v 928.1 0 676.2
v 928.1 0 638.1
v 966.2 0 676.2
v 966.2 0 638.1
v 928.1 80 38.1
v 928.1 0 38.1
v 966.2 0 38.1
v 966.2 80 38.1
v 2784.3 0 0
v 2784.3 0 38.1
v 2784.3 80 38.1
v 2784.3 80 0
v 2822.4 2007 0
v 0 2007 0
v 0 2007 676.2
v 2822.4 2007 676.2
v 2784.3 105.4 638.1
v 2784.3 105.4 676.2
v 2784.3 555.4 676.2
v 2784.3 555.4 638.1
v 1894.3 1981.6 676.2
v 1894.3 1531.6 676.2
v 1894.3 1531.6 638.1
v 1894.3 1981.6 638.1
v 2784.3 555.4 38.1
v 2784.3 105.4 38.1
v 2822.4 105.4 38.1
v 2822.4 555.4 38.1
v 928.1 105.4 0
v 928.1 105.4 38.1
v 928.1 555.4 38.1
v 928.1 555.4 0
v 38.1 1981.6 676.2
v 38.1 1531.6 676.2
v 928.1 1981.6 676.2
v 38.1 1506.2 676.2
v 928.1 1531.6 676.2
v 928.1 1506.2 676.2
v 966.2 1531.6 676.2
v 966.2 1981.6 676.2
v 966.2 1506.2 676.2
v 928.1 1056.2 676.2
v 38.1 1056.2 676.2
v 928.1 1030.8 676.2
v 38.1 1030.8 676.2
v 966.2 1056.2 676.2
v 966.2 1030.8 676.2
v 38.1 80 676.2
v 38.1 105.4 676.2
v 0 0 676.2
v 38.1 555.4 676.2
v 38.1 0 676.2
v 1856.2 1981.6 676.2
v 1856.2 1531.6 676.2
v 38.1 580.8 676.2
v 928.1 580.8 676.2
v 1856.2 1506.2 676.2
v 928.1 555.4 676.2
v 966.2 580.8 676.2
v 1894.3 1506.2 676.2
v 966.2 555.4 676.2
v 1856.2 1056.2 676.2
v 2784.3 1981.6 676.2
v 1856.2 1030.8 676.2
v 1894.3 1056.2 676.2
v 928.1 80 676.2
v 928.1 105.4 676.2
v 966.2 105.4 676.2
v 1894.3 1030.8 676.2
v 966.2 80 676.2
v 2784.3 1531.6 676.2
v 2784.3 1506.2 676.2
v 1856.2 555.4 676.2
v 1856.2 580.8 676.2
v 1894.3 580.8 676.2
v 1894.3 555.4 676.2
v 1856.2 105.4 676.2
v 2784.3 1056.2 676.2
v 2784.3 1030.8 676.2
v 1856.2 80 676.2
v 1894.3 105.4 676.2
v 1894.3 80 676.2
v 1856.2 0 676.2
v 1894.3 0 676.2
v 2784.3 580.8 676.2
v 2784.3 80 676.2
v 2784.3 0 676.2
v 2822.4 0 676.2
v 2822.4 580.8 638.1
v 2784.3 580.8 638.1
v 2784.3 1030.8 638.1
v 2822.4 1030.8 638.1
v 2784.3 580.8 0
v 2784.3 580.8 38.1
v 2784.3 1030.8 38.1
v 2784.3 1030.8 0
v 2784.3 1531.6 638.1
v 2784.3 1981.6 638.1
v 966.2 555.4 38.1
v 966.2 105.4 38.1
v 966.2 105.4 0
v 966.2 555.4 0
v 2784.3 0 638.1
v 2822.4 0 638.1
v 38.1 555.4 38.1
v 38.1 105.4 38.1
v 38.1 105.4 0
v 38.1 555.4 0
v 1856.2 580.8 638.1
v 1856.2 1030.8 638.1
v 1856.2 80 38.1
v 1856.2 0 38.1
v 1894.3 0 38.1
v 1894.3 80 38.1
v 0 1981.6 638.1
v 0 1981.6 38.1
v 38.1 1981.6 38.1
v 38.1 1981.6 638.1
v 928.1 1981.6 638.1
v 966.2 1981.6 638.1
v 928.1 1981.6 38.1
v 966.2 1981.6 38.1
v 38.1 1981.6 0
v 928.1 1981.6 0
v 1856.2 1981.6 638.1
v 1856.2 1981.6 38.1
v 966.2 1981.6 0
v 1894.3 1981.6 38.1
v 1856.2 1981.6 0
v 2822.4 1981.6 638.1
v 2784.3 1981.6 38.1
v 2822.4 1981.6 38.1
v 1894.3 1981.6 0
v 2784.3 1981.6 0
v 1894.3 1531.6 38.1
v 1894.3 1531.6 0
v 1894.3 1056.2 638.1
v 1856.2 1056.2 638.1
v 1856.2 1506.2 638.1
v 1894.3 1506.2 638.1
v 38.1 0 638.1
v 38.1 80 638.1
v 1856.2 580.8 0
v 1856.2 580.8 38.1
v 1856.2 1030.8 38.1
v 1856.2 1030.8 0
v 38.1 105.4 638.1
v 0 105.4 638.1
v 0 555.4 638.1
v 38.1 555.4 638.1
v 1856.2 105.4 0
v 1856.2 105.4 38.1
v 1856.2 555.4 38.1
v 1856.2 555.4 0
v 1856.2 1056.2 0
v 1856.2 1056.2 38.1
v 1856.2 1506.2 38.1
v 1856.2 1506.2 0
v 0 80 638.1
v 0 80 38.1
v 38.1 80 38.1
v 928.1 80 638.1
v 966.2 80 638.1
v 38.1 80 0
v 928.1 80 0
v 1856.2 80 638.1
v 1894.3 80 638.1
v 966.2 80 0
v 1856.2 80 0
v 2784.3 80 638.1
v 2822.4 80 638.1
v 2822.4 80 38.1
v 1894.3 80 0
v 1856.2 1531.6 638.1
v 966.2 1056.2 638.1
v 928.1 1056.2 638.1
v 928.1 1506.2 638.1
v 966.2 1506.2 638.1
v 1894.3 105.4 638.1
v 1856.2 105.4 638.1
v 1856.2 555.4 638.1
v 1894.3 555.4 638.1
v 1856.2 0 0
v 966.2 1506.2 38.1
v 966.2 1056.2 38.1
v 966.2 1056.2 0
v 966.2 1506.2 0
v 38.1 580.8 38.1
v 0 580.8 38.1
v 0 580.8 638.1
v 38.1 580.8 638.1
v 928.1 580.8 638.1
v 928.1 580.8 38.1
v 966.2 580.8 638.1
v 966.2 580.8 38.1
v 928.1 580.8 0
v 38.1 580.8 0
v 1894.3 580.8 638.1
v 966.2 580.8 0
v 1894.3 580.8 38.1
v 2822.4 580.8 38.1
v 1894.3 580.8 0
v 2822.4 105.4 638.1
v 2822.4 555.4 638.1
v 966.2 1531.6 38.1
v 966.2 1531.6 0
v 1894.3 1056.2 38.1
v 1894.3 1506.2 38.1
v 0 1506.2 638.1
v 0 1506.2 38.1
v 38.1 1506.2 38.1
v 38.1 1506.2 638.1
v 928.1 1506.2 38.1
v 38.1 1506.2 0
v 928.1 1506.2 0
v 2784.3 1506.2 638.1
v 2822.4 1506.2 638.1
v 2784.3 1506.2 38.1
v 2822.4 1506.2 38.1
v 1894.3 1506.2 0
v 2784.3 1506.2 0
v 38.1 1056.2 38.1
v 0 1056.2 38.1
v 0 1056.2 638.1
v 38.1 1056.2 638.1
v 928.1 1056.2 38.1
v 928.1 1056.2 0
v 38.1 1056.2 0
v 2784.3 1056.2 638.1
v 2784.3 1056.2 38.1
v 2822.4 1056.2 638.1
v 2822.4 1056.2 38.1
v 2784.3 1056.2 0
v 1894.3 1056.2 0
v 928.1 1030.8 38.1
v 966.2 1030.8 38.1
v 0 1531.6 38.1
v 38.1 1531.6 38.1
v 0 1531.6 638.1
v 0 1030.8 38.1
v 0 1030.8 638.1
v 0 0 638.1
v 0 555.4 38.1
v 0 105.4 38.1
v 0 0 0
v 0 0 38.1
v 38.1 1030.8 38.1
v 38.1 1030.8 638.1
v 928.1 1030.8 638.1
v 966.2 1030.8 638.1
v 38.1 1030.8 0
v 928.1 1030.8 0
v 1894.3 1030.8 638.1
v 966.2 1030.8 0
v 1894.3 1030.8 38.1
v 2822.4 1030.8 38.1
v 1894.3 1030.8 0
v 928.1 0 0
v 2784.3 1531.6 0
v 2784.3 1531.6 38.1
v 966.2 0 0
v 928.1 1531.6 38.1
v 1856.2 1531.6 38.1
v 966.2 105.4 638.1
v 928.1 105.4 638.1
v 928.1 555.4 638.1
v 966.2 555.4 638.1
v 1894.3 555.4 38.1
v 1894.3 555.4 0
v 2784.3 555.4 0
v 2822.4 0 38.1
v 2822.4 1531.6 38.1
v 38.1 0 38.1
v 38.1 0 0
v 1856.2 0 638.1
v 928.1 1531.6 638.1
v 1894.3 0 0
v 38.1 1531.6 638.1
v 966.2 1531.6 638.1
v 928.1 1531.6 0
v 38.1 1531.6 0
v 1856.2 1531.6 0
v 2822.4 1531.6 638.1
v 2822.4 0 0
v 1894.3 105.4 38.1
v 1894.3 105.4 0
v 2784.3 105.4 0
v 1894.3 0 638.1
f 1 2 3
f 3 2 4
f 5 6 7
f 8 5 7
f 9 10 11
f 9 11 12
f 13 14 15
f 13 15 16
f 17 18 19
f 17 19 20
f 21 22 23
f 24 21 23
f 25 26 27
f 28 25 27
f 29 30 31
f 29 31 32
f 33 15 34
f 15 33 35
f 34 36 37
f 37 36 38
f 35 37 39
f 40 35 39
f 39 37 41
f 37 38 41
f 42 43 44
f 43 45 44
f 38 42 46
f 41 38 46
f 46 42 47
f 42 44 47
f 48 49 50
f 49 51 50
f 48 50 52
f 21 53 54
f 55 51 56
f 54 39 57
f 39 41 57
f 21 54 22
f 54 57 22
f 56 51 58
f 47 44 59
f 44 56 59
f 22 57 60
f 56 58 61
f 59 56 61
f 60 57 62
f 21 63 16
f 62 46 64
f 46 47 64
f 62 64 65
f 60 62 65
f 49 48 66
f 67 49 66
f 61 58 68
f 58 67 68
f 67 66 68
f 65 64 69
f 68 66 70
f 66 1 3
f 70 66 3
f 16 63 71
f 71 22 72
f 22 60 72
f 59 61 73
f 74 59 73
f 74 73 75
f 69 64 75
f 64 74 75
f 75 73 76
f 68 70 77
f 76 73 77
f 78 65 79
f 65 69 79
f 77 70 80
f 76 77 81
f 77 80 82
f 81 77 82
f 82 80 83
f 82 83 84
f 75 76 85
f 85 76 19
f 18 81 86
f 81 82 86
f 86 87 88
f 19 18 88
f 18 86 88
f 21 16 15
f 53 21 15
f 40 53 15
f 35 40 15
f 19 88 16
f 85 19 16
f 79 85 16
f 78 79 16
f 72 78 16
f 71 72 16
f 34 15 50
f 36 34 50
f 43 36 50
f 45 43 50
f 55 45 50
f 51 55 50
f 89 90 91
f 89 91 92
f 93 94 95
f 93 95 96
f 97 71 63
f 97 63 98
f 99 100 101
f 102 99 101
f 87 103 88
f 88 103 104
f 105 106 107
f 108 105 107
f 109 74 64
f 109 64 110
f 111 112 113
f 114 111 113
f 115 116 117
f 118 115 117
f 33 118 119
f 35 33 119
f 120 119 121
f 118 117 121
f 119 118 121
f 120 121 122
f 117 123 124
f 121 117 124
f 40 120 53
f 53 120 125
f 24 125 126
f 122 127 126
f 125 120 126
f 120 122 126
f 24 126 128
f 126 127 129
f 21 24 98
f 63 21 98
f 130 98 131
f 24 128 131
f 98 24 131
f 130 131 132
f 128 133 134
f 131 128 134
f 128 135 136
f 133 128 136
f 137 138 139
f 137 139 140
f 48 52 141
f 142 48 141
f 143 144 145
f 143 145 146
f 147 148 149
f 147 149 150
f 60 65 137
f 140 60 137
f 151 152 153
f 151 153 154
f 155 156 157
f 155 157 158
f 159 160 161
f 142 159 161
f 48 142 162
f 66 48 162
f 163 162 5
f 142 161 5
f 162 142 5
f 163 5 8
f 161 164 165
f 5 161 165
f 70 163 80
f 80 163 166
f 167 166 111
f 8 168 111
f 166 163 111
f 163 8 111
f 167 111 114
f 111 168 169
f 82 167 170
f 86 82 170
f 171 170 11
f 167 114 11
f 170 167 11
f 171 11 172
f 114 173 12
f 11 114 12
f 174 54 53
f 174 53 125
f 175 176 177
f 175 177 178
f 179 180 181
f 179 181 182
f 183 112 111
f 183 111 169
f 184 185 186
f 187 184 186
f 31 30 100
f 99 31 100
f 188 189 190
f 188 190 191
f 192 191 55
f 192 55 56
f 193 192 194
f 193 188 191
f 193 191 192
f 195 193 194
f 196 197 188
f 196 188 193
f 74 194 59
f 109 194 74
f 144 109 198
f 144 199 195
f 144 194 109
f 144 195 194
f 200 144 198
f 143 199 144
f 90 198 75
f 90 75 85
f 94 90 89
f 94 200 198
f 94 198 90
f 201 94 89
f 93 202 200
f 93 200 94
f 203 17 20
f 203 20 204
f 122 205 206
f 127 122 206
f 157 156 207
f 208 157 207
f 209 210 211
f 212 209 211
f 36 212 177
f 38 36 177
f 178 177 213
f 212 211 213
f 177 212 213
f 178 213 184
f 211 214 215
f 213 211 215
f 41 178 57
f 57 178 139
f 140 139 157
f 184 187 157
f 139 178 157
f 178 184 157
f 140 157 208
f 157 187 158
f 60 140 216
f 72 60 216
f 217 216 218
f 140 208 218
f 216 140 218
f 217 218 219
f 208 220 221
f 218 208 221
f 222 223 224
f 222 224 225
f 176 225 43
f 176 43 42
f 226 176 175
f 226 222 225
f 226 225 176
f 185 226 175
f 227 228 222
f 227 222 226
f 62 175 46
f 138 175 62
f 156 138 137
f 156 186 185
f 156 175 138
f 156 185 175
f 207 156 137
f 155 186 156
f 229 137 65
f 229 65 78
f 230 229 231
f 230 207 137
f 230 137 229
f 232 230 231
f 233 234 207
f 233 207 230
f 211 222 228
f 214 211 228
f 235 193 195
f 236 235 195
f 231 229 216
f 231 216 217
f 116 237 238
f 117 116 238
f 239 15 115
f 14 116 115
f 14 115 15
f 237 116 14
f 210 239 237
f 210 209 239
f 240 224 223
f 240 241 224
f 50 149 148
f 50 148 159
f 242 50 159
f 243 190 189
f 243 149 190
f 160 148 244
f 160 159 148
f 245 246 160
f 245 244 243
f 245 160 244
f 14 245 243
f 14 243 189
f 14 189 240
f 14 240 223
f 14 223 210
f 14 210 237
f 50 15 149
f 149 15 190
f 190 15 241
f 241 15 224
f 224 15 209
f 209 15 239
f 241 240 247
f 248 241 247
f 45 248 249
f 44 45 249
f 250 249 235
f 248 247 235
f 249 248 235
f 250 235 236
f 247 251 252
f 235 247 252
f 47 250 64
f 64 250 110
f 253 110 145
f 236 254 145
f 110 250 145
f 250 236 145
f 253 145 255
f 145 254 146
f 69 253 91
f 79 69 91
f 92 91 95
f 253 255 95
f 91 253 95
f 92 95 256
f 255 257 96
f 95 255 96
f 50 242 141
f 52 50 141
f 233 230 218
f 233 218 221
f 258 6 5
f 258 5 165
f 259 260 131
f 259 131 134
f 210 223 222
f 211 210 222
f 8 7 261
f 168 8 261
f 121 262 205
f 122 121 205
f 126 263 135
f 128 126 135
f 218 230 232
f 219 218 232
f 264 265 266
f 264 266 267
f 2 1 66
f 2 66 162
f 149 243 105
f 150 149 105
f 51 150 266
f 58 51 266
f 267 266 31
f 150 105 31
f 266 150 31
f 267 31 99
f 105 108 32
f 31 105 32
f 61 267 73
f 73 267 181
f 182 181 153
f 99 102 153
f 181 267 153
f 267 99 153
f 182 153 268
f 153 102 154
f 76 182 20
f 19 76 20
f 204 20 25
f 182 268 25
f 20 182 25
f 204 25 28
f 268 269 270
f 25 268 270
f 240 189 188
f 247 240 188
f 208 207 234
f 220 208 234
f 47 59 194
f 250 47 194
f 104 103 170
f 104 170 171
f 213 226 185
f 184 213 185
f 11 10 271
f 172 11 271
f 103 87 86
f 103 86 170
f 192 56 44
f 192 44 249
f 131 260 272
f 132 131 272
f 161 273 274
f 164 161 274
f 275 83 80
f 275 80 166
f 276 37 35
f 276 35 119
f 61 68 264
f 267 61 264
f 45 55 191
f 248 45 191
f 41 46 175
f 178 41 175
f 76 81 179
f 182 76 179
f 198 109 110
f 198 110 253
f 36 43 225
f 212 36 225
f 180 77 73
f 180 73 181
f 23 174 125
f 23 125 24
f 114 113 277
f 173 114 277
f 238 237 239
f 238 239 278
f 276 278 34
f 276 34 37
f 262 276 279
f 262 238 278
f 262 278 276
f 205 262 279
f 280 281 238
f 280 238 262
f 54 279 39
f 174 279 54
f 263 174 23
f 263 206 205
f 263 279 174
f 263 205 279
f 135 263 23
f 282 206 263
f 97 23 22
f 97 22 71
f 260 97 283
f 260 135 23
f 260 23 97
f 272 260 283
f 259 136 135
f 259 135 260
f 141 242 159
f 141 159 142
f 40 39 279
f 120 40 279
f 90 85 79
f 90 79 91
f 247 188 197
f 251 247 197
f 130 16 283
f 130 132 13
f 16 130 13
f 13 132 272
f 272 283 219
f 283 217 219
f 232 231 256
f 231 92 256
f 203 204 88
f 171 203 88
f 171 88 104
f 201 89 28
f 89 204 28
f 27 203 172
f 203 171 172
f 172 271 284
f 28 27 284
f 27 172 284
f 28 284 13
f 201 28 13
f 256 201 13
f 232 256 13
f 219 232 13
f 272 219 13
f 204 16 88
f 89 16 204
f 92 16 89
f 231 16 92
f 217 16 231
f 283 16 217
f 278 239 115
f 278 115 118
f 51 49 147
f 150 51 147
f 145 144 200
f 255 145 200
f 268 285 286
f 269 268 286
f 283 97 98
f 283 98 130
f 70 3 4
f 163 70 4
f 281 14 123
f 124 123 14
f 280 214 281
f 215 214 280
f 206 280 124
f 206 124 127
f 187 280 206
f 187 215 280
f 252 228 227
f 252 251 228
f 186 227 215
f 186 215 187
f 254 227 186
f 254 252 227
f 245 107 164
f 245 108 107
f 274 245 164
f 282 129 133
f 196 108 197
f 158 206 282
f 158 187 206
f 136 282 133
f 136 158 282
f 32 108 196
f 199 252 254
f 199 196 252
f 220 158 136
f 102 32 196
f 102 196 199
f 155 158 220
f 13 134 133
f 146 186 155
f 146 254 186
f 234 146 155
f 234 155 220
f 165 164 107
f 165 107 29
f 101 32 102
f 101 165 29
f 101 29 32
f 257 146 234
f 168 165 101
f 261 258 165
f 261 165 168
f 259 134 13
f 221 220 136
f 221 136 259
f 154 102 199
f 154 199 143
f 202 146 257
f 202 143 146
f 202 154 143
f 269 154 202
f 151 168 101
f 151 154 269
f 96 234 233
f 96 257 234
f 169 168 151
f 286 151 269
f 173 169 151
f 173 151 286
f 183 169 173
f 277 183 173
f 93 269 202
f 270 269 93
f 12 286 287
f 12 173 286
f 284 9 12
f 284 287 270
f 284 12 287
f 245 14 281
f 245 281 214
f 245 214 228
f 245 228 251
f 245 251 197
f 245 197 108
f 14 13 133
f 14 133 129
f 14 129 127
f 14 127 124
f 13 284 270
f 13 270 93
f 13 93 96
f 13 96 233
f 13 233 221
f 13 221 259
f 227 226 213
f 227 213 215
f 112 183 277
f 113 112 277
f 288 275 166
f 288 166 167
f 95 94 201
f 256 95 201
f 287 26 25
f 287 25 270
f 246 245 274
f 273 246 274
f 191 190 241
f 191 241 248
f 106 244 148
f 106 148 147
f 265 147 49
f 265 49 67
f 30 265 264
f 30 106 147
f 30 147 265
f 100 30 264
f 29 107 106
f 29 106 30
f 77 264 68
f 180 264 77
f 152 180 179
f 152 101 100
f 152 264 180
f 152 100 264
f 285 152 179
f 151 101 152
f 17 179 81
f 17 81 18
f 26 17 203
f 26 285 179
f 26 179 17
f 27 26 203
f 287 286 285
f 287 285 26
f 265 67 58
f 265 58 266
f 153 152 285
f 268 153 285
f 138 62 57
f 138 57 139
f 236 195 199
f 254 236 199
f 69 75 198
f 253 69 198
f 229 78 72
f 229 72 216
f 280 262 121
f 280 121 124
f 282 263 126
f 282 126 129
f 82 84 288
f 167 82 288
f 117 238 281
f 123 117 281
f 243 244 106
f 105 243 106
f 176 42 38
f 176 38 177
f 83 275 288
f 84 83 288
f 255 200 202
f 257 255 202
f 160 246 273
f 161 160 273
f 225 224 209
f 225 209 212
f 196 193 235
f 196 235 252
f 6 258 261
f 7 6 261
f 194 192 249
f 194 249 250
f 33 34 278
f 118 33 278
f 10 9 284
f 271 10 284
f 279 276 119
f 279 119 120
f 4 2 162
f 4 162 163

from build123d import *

# Parameters (mm, degrees)
CROQUIS1_W                = 38.1
CROQUIS1_H                = 38.1
SALIENTE_EXTRUIR1_DEPTH   = 80
SALIENTE_EXTRUIR1_2_DEPTH = 80
SALIENTE_EXTRUIR1_3_DEPTH = 80
SALIENTE_EXTRUIR1_4_DEPTH = 80
SALIENTE_EXTRUIR1_5_DEPTH = 80
SALIENTE_EXTRUIR1_6_DEPTH = 80
SALIENTE_EXTRUIR1_7_DEPTH = 80
SALIENTE_EXTRUIR1_8_DEPTH = 80
CROQUIS2_W                = 2822.4
CROQUIS2_H                = 676.2
SALIENTE_EXTRUIR2_DEPTH   = 25.4
CROQUIS3_W                = 38.1
CROQUIS3_H                = 38.1
SALIENTE_EXTRUIR3_DEPTH   = 450
CROQUIS4_W                = 2822.4
CROQUIS4_H                = 676.2
SALIENTE_EXTRUIR4_DEPTH   = 25.4
CROQUIS5_W                = 38.1
CROQUIS5_H                = 38.1
SALIENTE_EXTRUIR5_DEPTH   = 450
CROQUIS6_W                = 2822.4
CROQUIS6_H                = 676.2
SALIENTE_EXTRUIR6_DEPTH   = 25.4
CROQUIS7_W                = 38.1
CROQUIS7_H                = 38.1
SALIENTE_EXTRUIR7_DEPTH   = 450
CROQUIS8_W                = 2822.4
CROQUIS8_H                = 676.2
SALIENTE_EXTRUIR8_DEPTH   = 25.4
CROQUIS9_W                = 38.1
CROQUIS9_H                = 38.1
SALIENTE_EXTRUIR9_DEPTH   = 450
CROQUIS10_W               = 2822.4
CROQUIS10_H               = 676.2
SALIENTE_EXTRUIR10_DEPTH  = 25.4


with BuildPart() as part:
    # Croquis1 → Saliente-Extruir1 (new body)
    with BuildSketch(Plane(origin=(0, 0, 0), x_dir=(1, 0, 0), z_dir=(0, 1, 0))):
        with Locations((19.05, -19.05)):
            Rectangle(CROQUIS1_W, CROQUIS1_H)
    extrude(amount=SALIENTE_EXTRUIR1_DEPTH)



with BuildPart() as body_2:
    # Croquis1 → Saliente-Extruir1 2 (new body)
    with BuildSketch(Plane(origin=(0, 0, 0), x_dir=(1, 0, 0), z_dir=(0, 1, 0))):
        with Locations((947.15, -19.05)):
            Rectangle(CROQUIS1_W, CROQUIS1_H)
    extrude(amount=SALIENTE_EXTRUIR1_2_DEPTH)


with BuildPart() as body_3:
    # Croquis1 → Saliente-Extruir1 3 (new body)
    with BuildSketch(Plane(origin=(0, 0, 0), x_dir=(1, 0, 0), z_dir=(0, 1, 0))):
        with Locations((1875.25, -19.05)):
            Rectangle(CROQUIS1_W, CROQUIS1_H)
    extrude(amount=SALIENTE_EXTRUIR1_3_DEPTH)


with BuildPart() as body_4:
    # Croquis1 → Saliente-Extruir1 4 (new body)
    with BuildSketch(Plane(origin=(0, 0, 0), x_dir=(1, 0, 0), z_dir=(0, 1, 0))):
        with Locations((2803.35, -19.05)):
            Rectangle(CROQUIS1_W, CROQUIS1_H)
    extrude(amount=SALIENTE_EXTRUIR1_4_DEPTH)


with BuildPart() as body_5:
    # Croquis1 → Saliente-Extruir1 5 (new body)
    with BuildSketch(Plane(origin=(0, 0, 0), x_dir=(1, 0, 0), z_dir=(0, 1, 0))):
        with Locations((2803.35, -657.15)):
            Rectangle(CROQUIS1_W, CROQUIS1_H)
    extrude(amount=SALIENTE_EXTRUIR1_5_DEPTH)


with BuildPart() as body_6:
    # Croquis1 → Saliente-Extruir1 6 (new body)
    with BuildSketch(Plane(origin=(0, 0, 0), x_dir=(1, 0, 0), z_dir=(0, 1, 0))):
        with Locations((1875.25, -657.15)):
            Rectangle(CROQUIS1_W, CROQUIS1_H)
    extrude(amount=SALIENTE_EXTRUIR1_6_DEPTH)


with BuildPart() as body_7:
    # Croquis1 → Saliente-Extruir1 7 (new body)
    with BuildSketch(Plane(origin=(0, 0, 0), x_dir=(1, 0, 0), z_dir=(0, 1, 0))):
        with Locations((947.15, -657.15)):
            Rectangle(CROQUIS1_W, CROQUIS1_H)
    extrude(amount=SALIENTE_EXTRUIR1_7_DEPTH)


with BuildPart() as body_8:
    # Croquis1 → Saliente-Extruir1 8 (new body)
    with BuildSketch(Plane(origin=(0, 0, 0), x_dir=(1, 0, 0), z_dir=(0, 1, 0))):
        with Locations((19.05, -657.15)):
            Rectangle(CROQUIS1_W, CROQUIS1_H)
    extrude(amount=SALIENTE_EXTRUIR1_8_DEPTH)


with BuildPart() as part_1:
    add(part.part)

    add(body_2.part)  # Saliente-Extruir2 merges body 2

    add(body_3.part)  # Saliente-Extruir2 merges body 3

    add(body_4.part)  # Saliente-Extruir2 merges body 4

    add(body_5.part)  # Saliente-Extruir2 merges body 5

    add(body_6.part)  # Saliente-Extruir2 merges body 6

    add(body_7.part)  # Saliente-Extruir2 merges body 7

    add(body_8.part)  # Saliente-Extruir2 merges body 8
    # Croquis2 → Saliente-Extruir2 (add)
    with BuildSketch(Plane(origin=(0, 80, 0), x_dir=(1, 0, 0), z_dir=(0, 1, 0))):
        with Locations((1411.2, -338.1)):
            Rectangle(CROQUIS2_W, CROQUIS2_H)
    extrude(amount=SALIENTE_EXTRUIR2_DEPTH)

    # Croquis3 → Saliente-Extruir3 (add)
    with BuildSketch(Plane(origin=(0, 105.4, 0), x_dir=(1, 0, 0), z_dir=(0, 1, 0))):
        with Locations((19.05, -19.05)):
            Rectangle(CROQUIS3_W, CROQUIS3_H)
        with Locations((947.15, -19.05)):
            Rectangle(CROQUIS3_W, CROQUIS3_H)
        with Locations((1875.25, -19.05)):
            Rectangle(CROQUIS3_W, CROQUIS3_H)
        with Locations((2803.35, -19.05)):
            Rectangle(CROQUIS3_W, CROQUIS3_H)
        with Locations((2803.35, -657.15)):
            Rectangle(CROQUIS3_W, CROQUIS3_H)
        with Locations((1875.25, -657.15)):
            Rectangle(CROQUIS3_W, CROQUIS3_H)
        with Locations((947.15, -657.15)):
            Rectangle(CROQUIS3_W, CROQUIS3_H)
        with Locations((19.05, -657.15)):
            Rectangle(CROQUIS3_W, CROQUIS3_H)
    extrude(amount=SALIENTE_EXTRUIR3_DEPTH)

    # Croquis4 → Saliente-Extruir4 (add)
    with BuildSketch(Plane(origin=(0, 555.4, 0), x_dir=(1, 0, 0), z_dir=(0, 1, 0))):
        with Locations((1411.2, -338.1)):
            Rectangle(CROQUIS4_W, CROQUIS4_H)
    extrude(amount=SALIENTE_EXTRUIR4_DEPTH)

    # Croquis5 → Saliente-Extruir5 (add)
    with BuildSketch(Plane(origin=(0, 580.8, 0), x_dir=(1, 0, 0), z_dir=(0, 1, 0))):
        with Locations((19.05, -19.05)):
            Rectangle(CROQUIS5_W, CROQUIS5_H)
        with Locations((947.15, -19.05)):
            Rectangle(CROQUIS5_W, CROQUIS5_H)
        with Locations((1875.25, -19.05)):
            Rectangle(CROQUIS5_W, CROQUIS5_H)
        with Locations((2803.35, -19.05)):
            Rectangle(CROQUIS5_W, CROQUIS5_H)
        with Locations((2803.35, -657.15)):
            Rectangle(CROQUIS5_W, CROQUIS5_H)
        with Locations((1875.25, -657.15)):
            Rectangle(CROQUIS5_W, CROQUIS5_H)
        with Locations((947.15, -657.15)):
            Rectangle(CROQUIS5_W, CROQUIS5_H)
        with Locations((19.05, -657.15)):
            Rectangle(CROQUIS5_W, CROQUIS5_H)
    extrude(amount=SALIENTE_EXTRUIR5_DEPTH)

    # Croquis6 → Saliente-Extruir6 (add)
    with BuildSketch(Plane(origin=(0, 1030.8, 0), x_dir=(1, 0, 0), z_dir=(0, 1, 0))):
        with Locations((1411.2, -338.1)):
            Rectangle(CROQUIS6_W, CROQUIS6_H)
    extrude(amount=SALIENTE_EXTRUIR6_DEPTH)

    # Croquis7 → Saliente-Extruir7 (add)
    with BuildSketch(Plane(origin=(0, 1056.2, 0), x_dir=(1, 0, 0), z_dir=(0, 1, 0))):
        with Locations((19.05, -19.05)):
            Rectangle(CROQUIS7_W, CROQUIS7_H)
        with Locations((947.15, -19.05)):
            Rectangle(CROQUIS7_W, CROQUIS7_H)
        with Locations((1875.25, -19.05)):
            Rectangle(CROQUIS7_W, CROQUIS7_H)
        with Locations((2803.35, -19.05)):
            Rectangle(CROQUIS7_W, CROQUIS7_H)
        with Locations((2803.35, -657.15)):
            Rectangle(CROQUIS7_W, CROQUIS7_H)
        with Locations((1875.25, -657.15)):
            Rectangle(CROQUIS7_W, CROQUIS7_H)
        with Locations((947.15, -657.15)):
            Rectangle(CROQUIS7_W, CROQUIS7_H)
        with Locations((19.05, -657.15)):
            Rectangle(CROQUIS7_W, CROQUIS7_H)
    extrude(amount=SALIENTE_EXTRUIR7_DEPTH)

    # Croquis8 → Saliente-Extruir8 (add)
    with BuildSketch(Plane(origin=(0, 1506.2, 0), x_dir=(1, 0, 0), z_dir=(0, 1, 0))):
        with Locations((1411.2, -338.1)):
            Rectangle(CROQUIS8_W, CROQUIS8_H)
    extrude(amount=SALIENTE_EXTRUIR8_DEPTH)

    # Croquis9 → Saliente-Extruir9 (add)
    with BuildSketch(Plane(origin=(0, 1531.6, 0), x_dir=(1, 0, 0), z_dir=(0, 1, 0))):
        with Locations((19.05, -19.05)):
            Rectangle(CROQUIS9_W, CROQUIS9_H)
        with Locations((947.15, -19.05)):
            Rectangle(CROQUIS9_W, CROQUIS9_H)
        with Locations((1875.25, -19.05)):
            Rectangle(CROQUIS9_W, CROQUIS9_H)
        with Locations((2803.35, -19.05)):
            Rectangle(CROQUIS9_W, CROQUIS9_H)
        with Locations((2803.35, -657.15)):
            Rectangle(CROQUIS9_W, CROQUIS9_H)
        with Locations((1875.25, -657.15)):
            Rectangle(CROQUIS9_W, CROQUIS9_H)
        with Locations((947.15, -657.15)):
            Rectangle(CROQUIS9_W, CROQUIS9_H)
        with Locations((19.05, -657.15)):
            Rectangle(CROQUIS9_W, CROQUIS9_H)
    extrude(amount=SALIENTE_EXTRUIR9_DEPTH)

    # Croquis10 → Saliente-Extruir10 (add)
    with BuildSketch(Plane(origin=(0, 1981.6, 0), x_dir=(1, 0, 0), z_dir=(0, 1, 0))):
        with Locations((1411.2, -338.1)):
            Rectangle(CROQUIS10_W, CROQUIS10_H)
    extrude(amount=SALIENTE_EXTRUIR10_DEPTH)


solid = part_1.part
